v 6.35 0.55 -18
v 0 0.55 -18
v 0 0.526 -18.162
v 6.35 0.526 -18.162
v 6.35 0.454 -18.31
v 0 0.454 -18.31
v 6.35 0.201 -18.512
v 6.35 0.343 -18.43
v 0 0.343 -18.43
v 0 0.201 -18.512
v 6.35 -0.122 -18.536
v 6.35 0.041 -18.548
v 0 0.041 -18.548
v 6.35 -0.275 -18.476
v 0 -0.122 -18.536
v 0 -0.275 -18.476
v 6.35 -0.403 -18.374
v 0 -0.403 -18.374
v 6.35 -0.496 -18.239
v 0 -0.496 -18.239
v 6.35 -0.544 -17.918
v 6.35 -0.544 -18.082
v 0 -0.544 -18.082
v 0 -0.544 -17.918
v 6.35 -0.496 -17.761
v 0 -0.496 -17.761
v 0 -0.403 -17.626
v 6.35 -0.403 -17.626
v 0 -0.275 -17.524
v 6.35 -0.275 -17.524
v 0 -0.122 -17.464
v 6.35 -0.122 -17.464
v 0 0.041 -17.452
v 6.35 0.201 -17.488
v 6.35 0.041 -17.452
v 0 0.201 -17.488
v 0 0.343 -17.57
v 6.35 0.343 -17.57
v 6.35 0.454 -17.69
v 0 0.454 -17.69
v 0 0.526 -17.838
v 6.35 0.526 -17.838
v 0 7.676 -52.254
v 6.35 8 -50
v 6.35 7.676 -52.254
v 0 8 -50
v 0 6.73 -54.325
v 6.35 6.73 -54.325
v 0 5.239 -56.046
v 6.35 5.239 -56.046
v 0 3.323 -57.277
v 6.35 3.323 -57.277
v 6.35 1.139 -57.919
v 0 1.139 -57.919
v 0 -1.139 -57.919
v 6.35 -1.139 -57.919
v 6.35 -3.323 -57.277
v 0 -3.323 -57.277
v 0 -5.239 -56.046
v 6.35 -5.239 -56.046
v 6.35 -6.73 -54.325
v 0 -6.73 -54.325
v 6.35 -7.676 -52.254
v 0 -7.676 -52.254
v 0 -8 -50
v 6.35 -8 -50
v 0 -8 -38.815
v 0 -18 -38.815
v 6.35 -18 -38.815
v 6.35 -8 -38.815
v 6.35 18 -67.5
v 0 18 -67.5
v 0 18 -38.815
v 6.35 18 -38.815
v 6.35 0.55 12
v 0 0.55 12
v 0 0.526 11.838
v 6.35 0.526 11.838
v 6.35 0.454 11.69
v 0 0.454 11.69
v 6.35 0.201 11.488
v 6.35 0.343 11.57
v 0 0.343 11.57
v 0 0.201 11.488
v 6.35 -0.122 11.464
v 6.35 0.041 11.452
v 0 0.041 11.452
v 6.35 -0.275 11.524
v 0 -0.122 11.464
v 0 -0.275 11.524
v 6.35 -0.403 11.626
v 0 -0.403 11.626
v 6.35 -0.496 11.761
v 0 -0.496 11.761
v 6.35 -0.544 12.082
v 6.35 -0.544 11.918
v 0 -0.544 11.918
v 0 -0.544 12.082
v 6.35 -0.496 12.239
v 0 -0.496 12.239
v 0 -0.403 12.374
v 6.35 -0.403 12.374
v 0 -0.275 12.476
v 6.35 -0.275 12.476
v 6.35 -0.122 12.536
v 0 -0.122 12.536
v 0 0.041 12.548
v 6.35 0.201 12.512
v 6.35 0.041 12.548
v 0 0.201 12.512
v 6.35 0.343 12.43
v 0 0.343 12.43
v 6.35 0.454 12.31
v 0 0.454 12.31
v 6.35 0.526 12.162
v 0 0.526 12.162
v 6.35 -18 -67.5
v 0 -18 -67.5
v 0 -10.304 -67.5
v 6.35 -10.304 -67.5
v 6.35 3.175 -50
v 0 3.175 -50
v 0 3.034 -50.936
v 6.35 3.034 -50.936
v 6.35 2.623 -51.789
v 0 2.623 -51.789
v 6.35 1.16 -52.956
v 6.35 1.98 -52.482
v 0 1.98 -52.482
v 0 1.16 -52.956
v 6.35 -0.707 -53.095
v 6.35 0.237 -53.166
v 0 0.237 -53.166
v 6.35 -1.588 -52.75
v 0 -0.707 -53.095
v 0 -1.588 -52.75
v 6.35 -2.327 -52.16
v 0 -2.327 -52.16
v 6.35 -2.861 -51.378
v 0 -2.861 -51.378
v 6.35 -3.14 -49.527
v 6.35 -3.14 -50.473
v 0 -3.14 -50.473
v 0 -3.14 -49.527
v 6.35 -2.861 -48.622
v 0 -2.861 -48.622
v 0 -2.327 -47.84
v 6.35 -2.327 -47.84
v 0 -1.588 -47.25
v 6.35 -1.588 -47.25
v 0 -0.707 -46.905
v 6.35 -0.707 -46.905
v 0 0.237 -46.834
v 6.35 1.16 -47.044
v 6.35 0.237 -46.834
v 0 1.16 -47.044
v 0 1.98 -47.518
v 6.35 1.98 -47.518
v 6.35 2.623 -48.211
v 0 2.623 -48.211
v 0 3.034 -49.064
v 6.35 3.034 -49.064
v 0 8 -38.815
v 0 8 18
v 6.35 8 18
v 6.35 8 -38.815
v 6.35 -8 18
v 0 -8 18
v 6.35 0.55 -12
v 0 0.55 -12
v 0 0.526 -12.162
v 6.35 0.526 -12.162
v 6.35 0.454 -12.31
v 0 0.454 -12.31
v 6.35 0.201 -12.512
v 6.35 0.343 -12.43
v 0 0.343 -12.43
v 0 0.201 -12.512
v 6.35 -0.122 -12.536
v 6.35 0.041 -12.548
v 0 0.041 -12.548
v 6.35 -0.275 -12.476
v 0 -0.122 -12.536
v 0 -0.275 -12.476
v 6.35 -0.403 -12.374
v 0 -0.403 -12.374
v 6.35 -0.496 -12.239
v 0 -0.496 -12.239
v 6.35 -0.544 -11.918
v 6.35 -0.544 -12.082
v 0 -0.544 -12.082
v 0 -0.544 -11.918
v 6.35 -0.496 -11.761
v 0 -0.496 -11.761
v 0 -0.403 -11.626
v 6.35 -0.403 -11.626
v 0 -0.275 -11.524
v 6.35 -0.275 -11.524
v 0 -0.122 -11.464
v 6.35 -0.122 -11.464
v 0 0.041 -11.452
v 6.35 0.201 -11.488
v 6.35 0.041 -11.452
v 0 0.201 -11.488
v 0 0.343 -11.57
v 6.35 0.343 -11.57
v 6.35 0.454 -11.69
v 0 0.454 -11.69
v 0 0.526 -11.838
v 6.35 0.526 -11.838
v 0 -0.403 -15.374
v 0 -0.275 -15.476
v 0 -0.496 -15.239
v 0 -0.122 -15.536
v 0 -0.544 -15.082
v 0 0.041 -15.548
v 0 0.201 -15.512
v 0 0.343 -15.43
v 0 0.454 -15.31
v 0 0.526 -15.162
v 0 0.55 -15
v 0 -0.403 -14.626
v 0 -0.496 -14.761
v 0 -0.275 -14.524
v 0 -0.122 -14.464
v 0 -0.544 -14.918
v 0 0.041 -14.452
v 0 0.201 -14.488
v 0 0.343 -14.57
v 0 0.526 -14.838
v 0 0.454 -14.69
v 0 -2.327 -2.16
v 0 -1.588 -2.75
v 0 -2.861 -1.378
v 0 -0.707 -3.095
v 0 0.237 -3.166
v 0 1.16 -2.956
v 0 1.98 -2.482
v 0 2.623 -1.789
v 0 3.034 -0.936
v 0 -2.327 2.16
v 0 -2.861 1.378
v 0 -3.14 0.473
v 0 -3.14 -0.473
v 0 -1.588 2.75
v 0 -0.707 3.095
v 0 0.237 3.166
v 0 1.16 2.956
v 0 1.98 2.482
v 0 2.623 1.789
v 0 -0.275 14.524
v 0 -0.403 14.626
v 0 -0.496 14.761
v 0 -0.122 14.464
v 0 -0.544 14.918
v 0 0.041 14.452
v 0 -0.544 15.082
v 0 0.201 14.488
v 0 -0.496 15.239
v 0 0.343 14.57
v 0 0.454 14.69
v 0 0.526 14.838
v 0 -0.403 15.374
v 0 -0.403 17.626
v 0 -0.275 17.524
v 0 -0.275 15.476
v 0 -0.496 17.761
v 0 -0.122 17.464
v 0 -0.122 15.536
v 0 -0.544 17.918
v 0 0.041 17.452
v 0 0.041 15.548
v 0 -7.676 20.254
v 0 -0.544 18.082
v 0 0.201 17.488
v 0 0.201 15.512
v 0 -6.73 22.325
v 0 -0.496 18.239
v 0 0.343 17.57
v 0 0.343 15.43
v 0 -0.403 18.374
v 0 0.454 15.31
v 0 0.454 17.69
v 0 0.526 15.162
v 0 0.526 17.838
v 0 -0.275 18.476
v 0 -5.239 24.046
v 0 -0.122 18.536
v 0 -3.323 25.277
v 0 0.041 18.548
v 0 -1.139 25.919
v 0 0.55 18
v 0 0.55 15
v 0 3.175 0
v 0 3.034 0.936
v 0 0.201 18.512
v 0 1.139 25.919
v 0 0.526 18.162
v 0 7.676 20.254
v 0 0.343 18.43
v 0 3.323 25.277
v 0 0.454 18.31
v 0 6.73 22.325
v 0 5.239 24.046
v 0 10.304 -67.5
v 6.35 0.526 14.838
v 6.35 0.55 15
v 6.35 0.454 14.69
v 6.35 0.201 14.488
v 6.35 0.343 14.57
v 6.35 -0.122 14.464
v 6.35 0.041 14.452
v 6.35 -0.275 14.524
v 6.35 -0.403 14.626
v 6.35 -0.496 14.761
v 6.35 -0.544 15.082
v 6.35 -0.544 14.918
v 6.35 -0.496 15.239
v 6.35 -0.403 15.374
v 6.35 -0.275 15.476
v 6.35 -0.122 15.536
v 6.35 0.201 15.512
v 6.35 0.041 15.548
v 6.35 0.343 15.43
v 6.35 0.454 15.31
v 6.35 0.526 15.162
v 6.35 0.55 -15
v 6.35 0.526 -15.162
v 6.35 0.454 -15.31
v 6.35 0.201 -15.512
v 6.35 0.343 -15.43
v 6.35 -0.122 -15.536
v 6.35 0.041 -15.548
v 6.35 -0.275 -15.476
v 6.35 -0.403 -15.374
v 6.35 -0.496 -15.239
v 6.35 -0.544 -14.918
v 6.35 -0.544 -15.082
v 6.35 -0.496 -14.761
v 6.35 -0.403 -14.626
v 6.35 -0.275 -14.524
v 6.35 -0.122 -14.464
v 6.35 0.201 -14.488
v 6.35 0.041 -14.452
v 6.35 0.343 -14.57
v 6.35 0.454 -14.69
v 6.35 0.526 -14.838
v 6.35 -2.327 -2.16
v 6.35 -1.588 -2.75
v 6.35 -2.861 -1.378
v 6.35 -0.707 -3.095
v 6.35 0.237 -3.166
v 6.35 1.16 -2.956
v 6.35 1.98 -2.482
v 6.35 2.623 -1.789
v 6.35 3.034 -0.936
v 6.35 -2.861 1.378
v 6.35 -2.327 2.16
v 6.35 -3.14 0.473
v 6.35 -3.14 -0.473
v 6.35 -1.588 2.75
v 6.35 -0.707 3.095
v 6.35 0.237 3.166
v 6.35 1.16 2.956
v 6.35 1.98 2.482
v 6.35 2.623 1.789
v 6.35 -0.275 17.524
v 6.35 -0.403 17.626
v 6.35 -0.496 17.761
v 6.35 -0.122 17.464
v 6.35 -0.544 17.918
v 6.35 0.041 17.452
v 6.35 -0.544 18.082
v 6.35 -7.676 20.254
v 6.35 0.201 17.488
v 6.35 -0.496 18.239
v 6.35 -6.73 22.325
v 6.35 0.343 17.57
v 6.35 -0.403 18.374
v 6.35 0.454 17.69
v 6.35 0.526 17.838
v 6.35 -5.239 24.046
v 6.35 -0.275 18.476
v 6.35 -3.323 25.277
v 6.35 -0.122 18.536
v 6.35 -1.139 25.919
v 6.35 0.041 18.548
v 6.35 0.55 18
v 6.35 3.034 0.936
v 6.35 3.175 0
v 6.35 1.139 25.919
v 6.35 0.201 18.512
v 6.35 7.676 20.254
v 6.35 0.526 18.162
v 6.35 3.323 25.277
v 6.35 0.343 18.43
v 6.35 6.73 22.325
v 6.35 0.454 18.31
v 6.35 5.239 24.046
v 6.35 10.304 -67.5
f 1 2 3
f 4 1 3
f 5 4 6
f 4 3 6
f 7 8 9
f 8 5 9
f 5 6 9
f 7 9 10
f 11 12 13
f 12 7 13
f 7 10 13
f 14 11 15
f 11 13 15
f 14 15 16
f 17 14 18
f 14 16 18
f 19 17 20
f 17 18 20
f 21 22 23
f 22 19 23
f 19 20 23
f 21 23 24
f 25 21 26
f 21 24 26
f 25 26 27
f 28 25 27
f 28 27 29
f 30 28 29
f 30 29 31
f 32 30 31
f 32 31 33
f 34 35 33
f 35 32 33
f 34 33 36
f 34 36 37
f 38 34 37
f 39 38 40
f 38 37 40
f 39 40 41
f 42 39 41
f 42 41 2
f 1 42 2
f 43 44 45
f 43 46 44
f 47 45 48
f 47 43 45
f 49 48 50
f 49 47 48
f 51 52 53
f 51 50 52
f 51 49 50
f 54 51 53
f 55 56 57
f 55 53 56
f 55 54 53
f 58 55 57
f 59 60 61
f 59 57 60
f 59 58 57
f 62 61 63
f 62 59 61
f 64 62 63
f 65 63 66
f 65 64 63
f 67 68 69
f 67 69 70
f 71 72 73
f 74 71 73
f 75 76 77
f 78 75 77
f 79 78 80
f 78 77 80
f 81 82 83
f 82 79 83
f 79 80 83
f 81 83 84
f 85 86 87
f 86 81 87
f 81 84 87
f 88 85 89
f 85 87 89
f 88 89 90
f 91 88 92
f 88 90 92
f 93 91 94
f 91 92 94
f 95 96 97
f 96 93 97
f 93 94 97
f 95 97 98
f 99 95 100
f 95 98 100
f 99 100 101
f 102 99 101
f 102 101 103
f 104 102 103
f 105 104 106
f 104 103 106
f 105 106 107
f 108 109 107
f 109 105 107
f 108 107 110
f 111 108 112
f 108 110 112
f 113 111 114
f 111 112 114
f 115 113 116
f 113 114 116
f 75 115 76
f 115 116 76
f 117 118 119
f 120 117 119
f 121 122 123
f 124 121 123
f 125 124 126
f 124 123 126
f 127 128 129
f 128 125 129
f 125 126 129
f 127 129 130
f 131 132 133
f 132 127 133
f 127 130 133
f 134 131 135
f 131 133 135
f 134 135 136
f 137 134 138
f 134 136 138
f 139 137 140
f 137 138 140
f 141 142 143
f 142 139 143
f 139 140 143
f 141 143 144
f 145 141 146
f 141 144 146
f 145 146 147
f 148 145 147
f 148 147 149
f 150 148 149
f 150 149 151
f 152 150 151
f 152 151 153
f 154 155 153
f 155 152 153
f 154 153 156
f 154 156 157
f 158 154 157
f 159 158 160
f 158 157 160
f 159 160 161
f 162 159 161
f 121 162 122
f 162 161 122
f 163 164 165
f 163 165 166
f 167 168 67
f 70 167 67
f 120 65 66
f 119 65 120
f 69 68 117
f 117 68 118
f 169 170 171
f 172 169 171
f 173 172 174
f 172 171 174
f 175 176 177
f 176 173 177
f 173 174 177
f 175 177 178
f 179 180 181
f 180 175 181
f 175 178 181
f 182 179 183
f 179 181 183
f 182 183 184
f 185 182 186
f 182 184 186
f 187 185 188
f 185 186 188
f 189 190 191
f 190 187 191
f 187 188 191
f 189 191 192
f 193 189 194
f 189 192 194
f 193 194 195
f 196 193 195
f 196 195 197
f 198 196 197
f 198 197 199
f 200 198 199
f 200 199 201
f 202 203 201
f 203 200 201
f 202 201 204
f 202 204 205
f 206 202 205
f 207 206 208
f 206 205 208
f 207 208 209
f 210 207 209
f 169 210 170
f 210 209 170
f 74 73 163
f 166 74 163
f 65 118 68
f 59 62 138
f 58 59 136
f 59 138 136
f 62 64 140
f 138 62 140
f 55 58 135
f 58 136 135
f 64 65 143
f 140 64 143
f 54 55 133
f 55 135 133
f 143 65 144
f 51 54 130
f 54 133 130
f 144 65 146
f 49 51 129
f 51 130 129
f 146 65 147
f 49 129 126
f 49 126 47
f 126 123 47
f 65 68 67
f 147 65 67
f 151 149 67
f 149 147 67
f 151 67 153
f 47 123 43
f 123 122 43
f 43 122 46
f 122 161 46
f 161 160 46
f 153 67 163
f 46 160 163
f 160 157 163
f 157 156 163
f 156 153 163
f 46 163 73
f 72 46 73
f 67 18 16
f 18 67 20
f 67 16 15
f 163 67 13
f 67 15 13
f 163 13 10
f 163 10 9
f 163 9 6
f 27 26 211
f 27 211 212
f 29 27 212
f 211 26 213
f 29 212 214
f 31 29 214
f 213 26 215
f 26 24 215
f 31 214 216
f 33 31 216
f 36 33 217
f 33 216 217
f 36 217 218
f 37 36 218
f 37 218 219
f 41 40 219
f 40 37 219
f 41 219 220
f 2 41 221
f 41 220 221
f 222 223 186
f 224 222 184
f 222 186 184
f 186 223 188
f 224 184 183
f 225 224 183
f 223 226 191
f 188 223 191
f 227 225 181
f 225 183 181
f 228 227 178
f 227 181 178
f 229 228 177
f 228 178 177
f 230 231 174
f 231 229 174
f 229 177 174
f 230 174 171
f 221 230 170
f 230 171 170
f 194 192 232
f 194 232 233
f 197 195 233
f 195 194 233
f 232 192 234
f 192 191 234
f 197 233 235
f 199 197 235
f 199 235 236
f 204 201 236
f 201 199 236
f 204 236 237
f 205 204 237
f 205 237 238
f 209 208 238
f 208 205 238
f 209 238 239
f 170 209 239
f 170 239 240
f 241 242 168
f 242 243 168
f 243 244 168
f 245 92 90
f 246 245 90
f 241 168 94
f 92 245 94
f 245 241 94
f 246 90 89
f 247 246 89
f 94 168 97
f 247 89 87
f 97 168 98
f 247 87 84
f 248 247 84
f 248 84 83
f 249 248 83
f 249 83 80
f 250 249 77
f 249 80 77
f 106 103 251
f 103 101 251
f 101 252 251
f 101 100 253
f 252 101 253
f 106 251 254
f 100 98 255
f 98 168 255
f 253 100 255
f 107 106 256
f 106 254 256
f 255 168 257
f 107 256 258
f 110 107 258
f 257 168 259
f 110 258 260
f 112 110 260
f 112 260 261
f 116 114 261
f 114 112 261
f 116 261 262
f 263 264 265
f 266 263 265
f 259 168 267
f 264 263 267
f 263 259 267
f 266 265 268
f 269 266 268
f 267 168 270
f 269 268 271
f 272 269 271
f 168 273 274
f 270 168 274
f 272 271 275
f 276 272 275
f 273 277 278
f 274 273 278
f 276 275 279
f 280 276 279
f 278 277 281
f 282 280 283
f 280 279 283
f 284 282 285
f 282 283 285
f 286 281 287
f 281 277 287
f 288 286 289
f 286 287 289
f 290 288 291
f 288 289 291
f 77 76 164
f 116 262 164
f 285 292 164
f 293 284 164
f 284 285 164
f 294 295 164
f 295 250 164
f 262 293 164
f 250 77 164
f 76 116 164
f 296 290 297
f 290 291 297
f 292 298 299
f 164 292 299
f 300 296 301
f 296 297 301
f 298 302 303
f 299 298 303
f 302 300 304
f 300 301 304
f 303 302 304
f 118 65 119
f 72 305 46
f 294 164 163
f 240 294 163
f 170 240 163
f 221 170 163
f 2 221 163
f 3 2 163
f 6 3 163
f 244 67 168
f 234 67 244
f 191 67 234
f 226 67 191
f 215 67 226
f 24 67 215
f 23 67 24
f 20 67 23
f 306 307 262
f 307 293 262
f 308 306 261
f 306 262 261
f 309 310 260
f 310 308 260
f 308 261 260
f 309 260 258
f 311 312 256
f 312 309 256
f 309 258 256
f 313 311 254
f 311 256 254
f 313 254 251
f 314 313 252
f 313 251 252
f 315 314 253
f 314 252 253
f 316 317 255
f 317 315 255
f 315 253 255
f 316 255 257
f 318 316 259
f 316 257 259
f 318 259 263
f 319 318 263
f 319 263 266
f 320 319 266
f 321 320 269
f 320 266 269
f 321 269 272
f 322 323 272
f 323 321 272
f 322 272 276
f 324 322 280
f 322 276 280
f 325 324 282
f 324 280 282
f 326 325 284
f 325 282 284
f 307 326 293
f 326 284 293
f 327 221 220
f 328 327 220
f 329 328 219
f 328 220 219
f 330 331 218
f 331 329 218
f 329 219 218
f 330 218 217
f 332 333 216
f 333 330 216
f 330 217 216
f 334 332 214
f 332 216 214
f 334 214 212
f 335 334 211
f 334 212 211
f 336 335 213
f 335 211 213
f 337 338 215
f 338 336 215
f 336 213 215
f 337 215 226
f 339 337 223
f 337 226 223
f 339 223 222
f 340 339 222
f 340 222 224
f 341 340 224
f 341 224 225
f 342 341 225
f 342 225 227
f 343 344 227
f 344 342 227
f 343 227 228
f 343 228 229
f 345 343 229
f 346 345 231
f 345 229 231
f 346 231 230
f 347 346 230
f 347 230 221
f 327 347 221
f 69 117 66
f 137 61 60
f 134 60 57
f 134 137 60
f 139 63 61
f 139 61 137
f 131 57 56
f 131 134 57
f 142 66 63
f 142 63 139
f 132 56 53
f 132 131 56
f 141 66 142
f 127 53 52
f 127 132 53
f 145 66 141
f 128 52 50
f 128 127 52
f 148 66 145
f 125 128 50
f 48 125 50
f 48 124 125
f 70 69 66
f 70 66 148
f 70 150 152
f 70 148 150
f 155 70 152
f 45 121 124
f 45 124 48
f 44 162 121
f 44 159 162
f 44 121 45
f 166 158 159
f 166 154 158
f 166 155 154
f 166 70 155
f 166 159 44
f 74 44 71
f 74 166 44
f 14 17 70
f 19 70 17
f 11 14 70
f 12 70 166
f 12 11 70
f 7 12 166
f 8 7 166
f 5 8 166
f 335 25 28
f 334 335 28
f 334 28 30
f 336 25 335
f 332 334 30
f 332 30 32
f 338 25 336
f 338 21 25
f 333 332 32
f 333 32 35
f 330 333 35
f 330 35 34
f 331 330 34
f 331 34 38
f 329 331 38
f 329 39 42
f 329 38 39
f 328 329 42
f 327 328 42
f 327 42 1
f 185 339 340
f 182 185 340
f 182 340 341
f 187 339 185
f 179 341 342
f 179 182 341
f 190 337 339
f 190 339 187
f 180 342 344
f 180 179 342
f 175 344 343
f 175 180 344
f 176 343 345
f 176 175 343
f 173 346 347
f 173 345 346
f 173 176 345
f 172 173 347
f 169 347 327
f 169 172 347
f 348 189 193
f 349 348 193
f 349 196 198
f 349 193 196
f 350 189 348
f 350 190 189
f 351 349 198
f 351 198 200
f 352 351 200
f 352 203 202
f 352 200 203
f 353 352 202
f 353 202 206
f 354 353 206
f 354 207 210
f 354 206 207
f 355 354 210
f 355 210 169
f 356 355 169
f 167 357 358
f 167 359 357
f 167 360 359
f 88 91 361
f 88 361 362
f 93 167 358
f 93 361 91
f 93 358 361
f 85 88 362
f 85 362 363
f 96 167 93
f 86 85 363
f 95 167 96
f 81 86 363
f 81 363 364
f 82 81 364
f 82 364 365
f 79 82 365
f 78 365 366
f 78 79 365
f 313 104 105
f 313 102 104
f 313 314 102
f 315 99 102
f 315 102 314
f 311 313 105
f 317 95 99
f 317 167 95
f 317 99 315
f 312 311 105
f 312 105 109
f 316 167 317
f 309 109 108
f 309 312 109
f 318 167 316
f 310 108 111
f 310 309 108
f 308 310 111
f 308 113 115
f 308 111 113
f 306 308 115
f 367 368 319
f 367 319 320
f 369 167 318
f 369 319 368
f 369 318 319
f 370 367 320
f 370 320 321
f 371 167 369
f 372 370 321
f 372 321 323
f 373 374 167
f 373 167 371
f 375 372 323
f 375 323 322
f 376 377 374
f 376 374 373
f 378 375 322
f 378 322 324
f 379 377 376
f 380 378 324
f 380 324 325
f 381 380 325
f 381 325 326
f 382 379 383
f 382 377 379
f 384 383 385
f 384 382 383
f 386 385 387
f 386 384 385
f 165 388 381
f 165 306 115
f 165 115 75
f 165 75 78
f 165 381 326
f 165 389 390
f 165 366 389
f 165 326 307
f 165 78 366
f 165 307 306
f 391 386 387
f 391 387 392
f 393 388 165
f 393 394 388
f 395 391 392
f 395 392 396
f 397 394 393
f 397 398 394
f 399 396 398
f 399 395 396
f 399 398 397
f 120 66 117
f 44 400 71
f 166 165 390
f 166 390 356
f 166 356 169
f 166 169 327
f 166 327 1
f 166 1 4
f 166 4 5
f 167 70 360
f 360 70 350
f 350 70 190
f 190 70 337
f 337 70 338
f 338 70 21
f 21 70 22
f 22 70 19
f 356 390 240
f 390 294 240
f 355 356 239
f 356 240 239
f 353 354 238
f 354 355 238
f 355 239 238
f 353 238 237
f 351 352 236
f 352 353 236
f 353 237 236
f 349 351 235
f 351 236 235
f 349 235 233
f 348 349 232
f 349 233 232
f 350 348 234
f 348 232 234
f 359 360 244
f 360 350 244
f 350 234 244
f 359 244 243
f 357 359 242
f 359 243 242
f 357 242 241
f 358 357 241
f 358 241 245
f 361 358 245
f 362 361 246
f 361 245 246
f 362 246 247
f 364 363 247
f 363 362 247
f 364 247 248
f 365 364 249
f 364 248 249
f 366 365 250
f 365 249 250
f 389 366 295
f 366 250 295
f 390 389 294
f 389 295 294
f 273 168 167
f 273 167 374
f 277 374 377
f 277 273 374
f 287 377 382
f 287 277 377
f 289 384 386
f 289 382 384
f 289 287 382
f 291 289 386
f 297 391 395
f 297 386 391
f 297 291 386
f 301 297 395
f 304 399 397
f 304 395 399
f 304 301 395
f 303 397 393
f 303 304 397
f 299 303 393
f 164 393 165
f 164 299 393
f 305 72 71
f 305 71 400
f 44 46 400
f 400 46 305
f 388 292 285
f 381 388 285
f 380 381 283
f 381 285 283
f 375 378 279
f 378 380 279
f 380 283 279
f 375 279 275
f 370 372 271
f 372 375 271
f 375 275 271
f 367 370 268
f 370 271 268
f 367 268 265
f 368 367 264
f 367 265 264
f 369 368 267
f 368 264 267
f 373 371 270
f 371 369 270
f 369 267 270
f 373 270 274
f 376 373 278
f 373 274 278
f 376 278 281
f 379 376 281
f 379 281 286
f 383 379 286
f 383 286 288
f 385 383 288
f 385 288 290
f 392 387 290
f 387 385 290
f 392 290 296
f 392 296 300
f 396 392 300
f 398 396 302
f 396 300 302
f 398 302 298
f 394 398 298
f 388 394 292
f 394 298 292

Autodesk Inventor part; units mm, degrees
ref_plane "YZ Plane" through (0, 0, 0) normal (1, 0, 0) x (0, 1, 0)
ref_plane "XZ Plane" through (0, 0, 0) normal (0, 1, 0) x (-1, 0, 0)
ref_plane "XY Plane" through (0, 0, 0) normal (0, 0, 1) x (1, 0, 0)
sketch "Block1" plane through (0, 0, 0) normal (0, 0, 1) x (1, 0, 0)
  circle A0 centre (-34.5082, -40.3774) radius 0.55
  circle A1 centre (-31.5082, -40.3774) radius 0.55
  circle A2 centre (-28.5082, -40.3774) radius 0.55
  point P0 (-31.5082, -40.3774)
  dimension "d7" = 1.1
  dimension "d8" = 1.1
  dimension "d9" = 1.1
sketch "Sketch1" plane through (0, 0, 0) normal (1, 0, 0) x (0, 1, 0)
  circle A0 centre (0, 0) radius 3.175
  line L0 (8, 0) -> (8, -50)
  line L1 (-8, 0) -> (-8, -50)
  arc A1 (-8, -50) -> (8, -50) centre (0, -50) ccw
  circle A2 centre (0, -50) radius 3.175
  line L2 (0, -86.2) -> (0, 44.7) construction
  line L3 (8, 0) -> (-8, 0) construction
  line L4 (8, 0) -> (8, 18)
  line L5 (-8, 0) -> (-8, 18)
  arc A3 (8, 18) -> (-8, 18) centre (0, 18) ccw
  line L6 (-25.2, 0) -> (25.2, 0) construction
  line L7 (-8, -42.5) -> (-18, -42.5)
  line L8 (-18, -42.5) -> (-18, -67.5)
  line L9 (-18, -67.5) -> (-8, -67.5)
  line L10 (-8, -67.5) -> (-8, -42.5)
  line L11 (-8, -42.5) -> (17.0955, -42.5) construction
  line L12 (-8, -50) -> (-18, -50)
  line L13 (-18, -50) -> (-18, -38.8151)
  line L14 (-18, -38.8151) -> (-8, -38.8151)
  line L15 (-8, -38.8151) -> (-8, -50)
  line L16 (-8, -50) -> (-10.3039, -67.5)
  line L17 (-8, -50) -> (9.651, -50) construction
  line L18 (8, -42.5) -> (18, -42.5)
  line L19 (18, -42.5) -> (18, -67.5)
  line L20 (18, -67.5) -> (8, -67.5)
  line L21 (8, -67.5) -> (8, -42.5)
  line L22 (8, -50) -> (18, -50)
  line L23 (18, -50) -> (18, -38.8151)
  line L24 (18, -38.8151) -> (8, -38.8151)
  line L25 (8, -38.8151) -> (8, -50)
  line L26 (8, -50) -> (10.3039, -67.5)
  circle A4 centre (0, -12) radius 0.55
  circle A5 centre (0, -15) radius 0.55
  circle A6 centre (0, -18) radius 0.55
  circle A7 centre (0, 12) radius 0.55
  circle A8 centre (0, 15) radius 0.55
  circle A9 centre (0, 18) radius 0.55
  point P0 (0, 0)
  point P1 (-8, -25)
  dimension "d0" = 6.35
  dimension "d2" = 16
  dimension "d4" = 6.35
  dimension "d11" = 12
  dimension "d12" = 50
  dimension "d16" = 10
  dimension "d17" = 25
  dimension "d18" = 42.5
  dimension "d20" = 10
  dimension "d21" = 97.5
extrude "Extrusion1" add sketch "Sketch1" along normal blind 6.35 contours L0 A1 L1 L5 A3 L4 | L24 L23 L18 L0 | L18 L19 L22 L0 | L22 L19 L20 L26 | L12 L8 L7 L1 | L16 L9 L8 L12 | L1 L7 L13 L14
equation "\"d7\" = d9"
equation "\"d8\" = d9"
properties part number "Crank Skiba"
